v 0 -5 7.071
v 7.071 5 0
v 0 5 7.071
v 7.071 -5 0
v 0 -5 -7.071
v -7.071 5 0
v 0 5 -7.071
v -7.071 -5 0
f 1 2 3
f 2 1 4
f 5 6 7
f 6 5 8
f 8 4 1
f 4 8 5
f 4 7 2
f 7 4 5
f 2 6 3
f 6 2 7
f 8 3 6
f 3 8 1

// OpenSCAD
rotate(a=[0,45,0]) {
	cube(size=[10, 10, 10], center=true);
}
